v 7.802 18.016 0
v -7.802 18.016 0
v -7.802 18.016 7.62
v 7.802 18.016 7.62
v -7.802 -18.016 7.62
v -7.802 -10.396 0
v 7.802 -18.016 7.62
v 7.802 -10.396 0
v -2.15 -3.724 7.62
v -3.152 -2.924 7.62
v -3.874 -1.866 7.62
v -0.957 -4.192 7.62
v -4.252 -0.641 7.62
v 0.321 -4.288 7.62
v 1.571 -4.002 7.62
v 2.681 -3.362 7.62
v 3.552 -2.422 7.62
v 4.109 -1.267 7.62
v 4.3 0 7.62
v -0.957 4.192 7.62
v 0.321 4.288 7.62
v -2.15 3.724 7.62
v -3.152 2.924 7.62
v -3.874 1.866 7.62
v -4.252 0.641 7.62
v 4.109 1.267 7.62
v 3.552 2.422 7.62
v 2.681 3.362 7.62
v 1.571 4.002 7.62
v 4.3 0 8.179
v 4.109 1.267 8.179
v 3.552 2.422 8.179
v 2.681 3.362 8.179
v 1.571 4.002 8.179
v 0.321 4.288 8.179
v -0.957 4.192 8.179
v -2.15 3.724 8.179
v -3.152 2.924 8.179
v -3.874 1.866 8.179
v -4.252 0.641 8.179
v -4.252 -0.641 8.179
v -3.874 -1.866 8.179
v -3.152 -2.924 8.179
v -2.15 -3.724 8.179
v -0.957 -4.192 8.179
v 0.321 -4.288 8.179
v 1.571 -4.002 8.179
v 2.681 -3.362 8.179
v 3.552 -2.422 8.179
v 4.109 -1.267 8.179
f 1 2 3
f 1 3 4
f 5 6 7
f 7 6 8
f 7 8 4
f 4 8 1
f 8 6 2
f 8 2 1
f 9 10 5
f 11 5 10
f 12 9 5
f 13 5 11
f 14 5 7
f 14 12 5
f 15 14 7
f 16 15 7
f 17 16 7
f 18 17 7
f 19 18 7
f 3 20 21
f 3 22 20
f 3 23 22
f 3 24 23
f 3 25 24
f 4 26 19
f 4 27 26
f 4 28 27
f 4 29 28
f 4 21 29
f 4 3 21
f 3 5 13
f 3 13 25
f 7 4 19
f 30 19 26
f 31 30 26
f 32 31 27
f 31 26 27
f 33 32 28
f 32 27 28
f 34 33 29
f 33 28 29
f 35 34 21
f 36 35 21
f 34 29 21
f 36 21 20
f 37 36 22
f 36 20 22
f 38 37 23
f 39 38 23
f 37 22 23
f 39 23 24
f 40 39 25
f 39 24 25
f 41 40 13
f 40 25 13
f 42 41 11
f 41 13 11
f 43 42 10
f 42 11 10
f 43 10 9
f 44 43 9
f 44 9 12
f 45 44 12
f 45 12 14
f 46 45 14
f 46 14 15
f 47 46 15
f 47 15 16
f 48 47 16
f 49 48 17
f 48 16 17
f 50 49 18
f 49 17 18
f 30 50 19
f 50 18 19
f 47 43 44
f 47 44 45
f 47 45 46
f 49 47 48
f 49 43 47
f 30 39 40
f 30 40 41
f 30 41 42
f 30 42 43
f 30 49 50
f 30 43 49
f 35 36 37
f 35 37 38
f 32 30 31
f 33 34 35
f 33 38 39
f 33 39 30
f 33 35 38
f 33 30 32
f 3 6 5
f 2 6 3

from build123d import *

# Parameters (mm, degrees)
F0_W     = 15.6047875062
F0_H     = 36.0328741372
F1_DEPTH = 7.62
F2_SIZE  = 7.61999
F3_R     = 4.2995581312
F4_DEPTH = 0.5588


# Not quite as in the source:
# - a fillet or chamfer is up to 0.001 mm smaller than in the source, because OpenCascade refuses the exact size


with BuildPart() as f1:
    # F0 (on Top) → F1 (new body)
    with BuildSketch(Plane.XY):
        Rectangle(F0_W, F0_H)
    extrude(amount=F1_DEPTH)

    # F2 (size 7.62 in the source; OpenCascade refuses exactly that, so slightly less here)
    f2_edges = [f1.edges().sort_by_distance(p)[0] for p in [
        (0, -18.016437, 0),
    ]]
    chamfer(f2_edges, length=F2_SIZE)

    # F3 (on face) → F4 (join)
    with BuildSketch(Plane.XY.offset(7.62)):
        Circle(F3_R)
    extrude(amount=F4_DEPTH)


solid = f1.part
